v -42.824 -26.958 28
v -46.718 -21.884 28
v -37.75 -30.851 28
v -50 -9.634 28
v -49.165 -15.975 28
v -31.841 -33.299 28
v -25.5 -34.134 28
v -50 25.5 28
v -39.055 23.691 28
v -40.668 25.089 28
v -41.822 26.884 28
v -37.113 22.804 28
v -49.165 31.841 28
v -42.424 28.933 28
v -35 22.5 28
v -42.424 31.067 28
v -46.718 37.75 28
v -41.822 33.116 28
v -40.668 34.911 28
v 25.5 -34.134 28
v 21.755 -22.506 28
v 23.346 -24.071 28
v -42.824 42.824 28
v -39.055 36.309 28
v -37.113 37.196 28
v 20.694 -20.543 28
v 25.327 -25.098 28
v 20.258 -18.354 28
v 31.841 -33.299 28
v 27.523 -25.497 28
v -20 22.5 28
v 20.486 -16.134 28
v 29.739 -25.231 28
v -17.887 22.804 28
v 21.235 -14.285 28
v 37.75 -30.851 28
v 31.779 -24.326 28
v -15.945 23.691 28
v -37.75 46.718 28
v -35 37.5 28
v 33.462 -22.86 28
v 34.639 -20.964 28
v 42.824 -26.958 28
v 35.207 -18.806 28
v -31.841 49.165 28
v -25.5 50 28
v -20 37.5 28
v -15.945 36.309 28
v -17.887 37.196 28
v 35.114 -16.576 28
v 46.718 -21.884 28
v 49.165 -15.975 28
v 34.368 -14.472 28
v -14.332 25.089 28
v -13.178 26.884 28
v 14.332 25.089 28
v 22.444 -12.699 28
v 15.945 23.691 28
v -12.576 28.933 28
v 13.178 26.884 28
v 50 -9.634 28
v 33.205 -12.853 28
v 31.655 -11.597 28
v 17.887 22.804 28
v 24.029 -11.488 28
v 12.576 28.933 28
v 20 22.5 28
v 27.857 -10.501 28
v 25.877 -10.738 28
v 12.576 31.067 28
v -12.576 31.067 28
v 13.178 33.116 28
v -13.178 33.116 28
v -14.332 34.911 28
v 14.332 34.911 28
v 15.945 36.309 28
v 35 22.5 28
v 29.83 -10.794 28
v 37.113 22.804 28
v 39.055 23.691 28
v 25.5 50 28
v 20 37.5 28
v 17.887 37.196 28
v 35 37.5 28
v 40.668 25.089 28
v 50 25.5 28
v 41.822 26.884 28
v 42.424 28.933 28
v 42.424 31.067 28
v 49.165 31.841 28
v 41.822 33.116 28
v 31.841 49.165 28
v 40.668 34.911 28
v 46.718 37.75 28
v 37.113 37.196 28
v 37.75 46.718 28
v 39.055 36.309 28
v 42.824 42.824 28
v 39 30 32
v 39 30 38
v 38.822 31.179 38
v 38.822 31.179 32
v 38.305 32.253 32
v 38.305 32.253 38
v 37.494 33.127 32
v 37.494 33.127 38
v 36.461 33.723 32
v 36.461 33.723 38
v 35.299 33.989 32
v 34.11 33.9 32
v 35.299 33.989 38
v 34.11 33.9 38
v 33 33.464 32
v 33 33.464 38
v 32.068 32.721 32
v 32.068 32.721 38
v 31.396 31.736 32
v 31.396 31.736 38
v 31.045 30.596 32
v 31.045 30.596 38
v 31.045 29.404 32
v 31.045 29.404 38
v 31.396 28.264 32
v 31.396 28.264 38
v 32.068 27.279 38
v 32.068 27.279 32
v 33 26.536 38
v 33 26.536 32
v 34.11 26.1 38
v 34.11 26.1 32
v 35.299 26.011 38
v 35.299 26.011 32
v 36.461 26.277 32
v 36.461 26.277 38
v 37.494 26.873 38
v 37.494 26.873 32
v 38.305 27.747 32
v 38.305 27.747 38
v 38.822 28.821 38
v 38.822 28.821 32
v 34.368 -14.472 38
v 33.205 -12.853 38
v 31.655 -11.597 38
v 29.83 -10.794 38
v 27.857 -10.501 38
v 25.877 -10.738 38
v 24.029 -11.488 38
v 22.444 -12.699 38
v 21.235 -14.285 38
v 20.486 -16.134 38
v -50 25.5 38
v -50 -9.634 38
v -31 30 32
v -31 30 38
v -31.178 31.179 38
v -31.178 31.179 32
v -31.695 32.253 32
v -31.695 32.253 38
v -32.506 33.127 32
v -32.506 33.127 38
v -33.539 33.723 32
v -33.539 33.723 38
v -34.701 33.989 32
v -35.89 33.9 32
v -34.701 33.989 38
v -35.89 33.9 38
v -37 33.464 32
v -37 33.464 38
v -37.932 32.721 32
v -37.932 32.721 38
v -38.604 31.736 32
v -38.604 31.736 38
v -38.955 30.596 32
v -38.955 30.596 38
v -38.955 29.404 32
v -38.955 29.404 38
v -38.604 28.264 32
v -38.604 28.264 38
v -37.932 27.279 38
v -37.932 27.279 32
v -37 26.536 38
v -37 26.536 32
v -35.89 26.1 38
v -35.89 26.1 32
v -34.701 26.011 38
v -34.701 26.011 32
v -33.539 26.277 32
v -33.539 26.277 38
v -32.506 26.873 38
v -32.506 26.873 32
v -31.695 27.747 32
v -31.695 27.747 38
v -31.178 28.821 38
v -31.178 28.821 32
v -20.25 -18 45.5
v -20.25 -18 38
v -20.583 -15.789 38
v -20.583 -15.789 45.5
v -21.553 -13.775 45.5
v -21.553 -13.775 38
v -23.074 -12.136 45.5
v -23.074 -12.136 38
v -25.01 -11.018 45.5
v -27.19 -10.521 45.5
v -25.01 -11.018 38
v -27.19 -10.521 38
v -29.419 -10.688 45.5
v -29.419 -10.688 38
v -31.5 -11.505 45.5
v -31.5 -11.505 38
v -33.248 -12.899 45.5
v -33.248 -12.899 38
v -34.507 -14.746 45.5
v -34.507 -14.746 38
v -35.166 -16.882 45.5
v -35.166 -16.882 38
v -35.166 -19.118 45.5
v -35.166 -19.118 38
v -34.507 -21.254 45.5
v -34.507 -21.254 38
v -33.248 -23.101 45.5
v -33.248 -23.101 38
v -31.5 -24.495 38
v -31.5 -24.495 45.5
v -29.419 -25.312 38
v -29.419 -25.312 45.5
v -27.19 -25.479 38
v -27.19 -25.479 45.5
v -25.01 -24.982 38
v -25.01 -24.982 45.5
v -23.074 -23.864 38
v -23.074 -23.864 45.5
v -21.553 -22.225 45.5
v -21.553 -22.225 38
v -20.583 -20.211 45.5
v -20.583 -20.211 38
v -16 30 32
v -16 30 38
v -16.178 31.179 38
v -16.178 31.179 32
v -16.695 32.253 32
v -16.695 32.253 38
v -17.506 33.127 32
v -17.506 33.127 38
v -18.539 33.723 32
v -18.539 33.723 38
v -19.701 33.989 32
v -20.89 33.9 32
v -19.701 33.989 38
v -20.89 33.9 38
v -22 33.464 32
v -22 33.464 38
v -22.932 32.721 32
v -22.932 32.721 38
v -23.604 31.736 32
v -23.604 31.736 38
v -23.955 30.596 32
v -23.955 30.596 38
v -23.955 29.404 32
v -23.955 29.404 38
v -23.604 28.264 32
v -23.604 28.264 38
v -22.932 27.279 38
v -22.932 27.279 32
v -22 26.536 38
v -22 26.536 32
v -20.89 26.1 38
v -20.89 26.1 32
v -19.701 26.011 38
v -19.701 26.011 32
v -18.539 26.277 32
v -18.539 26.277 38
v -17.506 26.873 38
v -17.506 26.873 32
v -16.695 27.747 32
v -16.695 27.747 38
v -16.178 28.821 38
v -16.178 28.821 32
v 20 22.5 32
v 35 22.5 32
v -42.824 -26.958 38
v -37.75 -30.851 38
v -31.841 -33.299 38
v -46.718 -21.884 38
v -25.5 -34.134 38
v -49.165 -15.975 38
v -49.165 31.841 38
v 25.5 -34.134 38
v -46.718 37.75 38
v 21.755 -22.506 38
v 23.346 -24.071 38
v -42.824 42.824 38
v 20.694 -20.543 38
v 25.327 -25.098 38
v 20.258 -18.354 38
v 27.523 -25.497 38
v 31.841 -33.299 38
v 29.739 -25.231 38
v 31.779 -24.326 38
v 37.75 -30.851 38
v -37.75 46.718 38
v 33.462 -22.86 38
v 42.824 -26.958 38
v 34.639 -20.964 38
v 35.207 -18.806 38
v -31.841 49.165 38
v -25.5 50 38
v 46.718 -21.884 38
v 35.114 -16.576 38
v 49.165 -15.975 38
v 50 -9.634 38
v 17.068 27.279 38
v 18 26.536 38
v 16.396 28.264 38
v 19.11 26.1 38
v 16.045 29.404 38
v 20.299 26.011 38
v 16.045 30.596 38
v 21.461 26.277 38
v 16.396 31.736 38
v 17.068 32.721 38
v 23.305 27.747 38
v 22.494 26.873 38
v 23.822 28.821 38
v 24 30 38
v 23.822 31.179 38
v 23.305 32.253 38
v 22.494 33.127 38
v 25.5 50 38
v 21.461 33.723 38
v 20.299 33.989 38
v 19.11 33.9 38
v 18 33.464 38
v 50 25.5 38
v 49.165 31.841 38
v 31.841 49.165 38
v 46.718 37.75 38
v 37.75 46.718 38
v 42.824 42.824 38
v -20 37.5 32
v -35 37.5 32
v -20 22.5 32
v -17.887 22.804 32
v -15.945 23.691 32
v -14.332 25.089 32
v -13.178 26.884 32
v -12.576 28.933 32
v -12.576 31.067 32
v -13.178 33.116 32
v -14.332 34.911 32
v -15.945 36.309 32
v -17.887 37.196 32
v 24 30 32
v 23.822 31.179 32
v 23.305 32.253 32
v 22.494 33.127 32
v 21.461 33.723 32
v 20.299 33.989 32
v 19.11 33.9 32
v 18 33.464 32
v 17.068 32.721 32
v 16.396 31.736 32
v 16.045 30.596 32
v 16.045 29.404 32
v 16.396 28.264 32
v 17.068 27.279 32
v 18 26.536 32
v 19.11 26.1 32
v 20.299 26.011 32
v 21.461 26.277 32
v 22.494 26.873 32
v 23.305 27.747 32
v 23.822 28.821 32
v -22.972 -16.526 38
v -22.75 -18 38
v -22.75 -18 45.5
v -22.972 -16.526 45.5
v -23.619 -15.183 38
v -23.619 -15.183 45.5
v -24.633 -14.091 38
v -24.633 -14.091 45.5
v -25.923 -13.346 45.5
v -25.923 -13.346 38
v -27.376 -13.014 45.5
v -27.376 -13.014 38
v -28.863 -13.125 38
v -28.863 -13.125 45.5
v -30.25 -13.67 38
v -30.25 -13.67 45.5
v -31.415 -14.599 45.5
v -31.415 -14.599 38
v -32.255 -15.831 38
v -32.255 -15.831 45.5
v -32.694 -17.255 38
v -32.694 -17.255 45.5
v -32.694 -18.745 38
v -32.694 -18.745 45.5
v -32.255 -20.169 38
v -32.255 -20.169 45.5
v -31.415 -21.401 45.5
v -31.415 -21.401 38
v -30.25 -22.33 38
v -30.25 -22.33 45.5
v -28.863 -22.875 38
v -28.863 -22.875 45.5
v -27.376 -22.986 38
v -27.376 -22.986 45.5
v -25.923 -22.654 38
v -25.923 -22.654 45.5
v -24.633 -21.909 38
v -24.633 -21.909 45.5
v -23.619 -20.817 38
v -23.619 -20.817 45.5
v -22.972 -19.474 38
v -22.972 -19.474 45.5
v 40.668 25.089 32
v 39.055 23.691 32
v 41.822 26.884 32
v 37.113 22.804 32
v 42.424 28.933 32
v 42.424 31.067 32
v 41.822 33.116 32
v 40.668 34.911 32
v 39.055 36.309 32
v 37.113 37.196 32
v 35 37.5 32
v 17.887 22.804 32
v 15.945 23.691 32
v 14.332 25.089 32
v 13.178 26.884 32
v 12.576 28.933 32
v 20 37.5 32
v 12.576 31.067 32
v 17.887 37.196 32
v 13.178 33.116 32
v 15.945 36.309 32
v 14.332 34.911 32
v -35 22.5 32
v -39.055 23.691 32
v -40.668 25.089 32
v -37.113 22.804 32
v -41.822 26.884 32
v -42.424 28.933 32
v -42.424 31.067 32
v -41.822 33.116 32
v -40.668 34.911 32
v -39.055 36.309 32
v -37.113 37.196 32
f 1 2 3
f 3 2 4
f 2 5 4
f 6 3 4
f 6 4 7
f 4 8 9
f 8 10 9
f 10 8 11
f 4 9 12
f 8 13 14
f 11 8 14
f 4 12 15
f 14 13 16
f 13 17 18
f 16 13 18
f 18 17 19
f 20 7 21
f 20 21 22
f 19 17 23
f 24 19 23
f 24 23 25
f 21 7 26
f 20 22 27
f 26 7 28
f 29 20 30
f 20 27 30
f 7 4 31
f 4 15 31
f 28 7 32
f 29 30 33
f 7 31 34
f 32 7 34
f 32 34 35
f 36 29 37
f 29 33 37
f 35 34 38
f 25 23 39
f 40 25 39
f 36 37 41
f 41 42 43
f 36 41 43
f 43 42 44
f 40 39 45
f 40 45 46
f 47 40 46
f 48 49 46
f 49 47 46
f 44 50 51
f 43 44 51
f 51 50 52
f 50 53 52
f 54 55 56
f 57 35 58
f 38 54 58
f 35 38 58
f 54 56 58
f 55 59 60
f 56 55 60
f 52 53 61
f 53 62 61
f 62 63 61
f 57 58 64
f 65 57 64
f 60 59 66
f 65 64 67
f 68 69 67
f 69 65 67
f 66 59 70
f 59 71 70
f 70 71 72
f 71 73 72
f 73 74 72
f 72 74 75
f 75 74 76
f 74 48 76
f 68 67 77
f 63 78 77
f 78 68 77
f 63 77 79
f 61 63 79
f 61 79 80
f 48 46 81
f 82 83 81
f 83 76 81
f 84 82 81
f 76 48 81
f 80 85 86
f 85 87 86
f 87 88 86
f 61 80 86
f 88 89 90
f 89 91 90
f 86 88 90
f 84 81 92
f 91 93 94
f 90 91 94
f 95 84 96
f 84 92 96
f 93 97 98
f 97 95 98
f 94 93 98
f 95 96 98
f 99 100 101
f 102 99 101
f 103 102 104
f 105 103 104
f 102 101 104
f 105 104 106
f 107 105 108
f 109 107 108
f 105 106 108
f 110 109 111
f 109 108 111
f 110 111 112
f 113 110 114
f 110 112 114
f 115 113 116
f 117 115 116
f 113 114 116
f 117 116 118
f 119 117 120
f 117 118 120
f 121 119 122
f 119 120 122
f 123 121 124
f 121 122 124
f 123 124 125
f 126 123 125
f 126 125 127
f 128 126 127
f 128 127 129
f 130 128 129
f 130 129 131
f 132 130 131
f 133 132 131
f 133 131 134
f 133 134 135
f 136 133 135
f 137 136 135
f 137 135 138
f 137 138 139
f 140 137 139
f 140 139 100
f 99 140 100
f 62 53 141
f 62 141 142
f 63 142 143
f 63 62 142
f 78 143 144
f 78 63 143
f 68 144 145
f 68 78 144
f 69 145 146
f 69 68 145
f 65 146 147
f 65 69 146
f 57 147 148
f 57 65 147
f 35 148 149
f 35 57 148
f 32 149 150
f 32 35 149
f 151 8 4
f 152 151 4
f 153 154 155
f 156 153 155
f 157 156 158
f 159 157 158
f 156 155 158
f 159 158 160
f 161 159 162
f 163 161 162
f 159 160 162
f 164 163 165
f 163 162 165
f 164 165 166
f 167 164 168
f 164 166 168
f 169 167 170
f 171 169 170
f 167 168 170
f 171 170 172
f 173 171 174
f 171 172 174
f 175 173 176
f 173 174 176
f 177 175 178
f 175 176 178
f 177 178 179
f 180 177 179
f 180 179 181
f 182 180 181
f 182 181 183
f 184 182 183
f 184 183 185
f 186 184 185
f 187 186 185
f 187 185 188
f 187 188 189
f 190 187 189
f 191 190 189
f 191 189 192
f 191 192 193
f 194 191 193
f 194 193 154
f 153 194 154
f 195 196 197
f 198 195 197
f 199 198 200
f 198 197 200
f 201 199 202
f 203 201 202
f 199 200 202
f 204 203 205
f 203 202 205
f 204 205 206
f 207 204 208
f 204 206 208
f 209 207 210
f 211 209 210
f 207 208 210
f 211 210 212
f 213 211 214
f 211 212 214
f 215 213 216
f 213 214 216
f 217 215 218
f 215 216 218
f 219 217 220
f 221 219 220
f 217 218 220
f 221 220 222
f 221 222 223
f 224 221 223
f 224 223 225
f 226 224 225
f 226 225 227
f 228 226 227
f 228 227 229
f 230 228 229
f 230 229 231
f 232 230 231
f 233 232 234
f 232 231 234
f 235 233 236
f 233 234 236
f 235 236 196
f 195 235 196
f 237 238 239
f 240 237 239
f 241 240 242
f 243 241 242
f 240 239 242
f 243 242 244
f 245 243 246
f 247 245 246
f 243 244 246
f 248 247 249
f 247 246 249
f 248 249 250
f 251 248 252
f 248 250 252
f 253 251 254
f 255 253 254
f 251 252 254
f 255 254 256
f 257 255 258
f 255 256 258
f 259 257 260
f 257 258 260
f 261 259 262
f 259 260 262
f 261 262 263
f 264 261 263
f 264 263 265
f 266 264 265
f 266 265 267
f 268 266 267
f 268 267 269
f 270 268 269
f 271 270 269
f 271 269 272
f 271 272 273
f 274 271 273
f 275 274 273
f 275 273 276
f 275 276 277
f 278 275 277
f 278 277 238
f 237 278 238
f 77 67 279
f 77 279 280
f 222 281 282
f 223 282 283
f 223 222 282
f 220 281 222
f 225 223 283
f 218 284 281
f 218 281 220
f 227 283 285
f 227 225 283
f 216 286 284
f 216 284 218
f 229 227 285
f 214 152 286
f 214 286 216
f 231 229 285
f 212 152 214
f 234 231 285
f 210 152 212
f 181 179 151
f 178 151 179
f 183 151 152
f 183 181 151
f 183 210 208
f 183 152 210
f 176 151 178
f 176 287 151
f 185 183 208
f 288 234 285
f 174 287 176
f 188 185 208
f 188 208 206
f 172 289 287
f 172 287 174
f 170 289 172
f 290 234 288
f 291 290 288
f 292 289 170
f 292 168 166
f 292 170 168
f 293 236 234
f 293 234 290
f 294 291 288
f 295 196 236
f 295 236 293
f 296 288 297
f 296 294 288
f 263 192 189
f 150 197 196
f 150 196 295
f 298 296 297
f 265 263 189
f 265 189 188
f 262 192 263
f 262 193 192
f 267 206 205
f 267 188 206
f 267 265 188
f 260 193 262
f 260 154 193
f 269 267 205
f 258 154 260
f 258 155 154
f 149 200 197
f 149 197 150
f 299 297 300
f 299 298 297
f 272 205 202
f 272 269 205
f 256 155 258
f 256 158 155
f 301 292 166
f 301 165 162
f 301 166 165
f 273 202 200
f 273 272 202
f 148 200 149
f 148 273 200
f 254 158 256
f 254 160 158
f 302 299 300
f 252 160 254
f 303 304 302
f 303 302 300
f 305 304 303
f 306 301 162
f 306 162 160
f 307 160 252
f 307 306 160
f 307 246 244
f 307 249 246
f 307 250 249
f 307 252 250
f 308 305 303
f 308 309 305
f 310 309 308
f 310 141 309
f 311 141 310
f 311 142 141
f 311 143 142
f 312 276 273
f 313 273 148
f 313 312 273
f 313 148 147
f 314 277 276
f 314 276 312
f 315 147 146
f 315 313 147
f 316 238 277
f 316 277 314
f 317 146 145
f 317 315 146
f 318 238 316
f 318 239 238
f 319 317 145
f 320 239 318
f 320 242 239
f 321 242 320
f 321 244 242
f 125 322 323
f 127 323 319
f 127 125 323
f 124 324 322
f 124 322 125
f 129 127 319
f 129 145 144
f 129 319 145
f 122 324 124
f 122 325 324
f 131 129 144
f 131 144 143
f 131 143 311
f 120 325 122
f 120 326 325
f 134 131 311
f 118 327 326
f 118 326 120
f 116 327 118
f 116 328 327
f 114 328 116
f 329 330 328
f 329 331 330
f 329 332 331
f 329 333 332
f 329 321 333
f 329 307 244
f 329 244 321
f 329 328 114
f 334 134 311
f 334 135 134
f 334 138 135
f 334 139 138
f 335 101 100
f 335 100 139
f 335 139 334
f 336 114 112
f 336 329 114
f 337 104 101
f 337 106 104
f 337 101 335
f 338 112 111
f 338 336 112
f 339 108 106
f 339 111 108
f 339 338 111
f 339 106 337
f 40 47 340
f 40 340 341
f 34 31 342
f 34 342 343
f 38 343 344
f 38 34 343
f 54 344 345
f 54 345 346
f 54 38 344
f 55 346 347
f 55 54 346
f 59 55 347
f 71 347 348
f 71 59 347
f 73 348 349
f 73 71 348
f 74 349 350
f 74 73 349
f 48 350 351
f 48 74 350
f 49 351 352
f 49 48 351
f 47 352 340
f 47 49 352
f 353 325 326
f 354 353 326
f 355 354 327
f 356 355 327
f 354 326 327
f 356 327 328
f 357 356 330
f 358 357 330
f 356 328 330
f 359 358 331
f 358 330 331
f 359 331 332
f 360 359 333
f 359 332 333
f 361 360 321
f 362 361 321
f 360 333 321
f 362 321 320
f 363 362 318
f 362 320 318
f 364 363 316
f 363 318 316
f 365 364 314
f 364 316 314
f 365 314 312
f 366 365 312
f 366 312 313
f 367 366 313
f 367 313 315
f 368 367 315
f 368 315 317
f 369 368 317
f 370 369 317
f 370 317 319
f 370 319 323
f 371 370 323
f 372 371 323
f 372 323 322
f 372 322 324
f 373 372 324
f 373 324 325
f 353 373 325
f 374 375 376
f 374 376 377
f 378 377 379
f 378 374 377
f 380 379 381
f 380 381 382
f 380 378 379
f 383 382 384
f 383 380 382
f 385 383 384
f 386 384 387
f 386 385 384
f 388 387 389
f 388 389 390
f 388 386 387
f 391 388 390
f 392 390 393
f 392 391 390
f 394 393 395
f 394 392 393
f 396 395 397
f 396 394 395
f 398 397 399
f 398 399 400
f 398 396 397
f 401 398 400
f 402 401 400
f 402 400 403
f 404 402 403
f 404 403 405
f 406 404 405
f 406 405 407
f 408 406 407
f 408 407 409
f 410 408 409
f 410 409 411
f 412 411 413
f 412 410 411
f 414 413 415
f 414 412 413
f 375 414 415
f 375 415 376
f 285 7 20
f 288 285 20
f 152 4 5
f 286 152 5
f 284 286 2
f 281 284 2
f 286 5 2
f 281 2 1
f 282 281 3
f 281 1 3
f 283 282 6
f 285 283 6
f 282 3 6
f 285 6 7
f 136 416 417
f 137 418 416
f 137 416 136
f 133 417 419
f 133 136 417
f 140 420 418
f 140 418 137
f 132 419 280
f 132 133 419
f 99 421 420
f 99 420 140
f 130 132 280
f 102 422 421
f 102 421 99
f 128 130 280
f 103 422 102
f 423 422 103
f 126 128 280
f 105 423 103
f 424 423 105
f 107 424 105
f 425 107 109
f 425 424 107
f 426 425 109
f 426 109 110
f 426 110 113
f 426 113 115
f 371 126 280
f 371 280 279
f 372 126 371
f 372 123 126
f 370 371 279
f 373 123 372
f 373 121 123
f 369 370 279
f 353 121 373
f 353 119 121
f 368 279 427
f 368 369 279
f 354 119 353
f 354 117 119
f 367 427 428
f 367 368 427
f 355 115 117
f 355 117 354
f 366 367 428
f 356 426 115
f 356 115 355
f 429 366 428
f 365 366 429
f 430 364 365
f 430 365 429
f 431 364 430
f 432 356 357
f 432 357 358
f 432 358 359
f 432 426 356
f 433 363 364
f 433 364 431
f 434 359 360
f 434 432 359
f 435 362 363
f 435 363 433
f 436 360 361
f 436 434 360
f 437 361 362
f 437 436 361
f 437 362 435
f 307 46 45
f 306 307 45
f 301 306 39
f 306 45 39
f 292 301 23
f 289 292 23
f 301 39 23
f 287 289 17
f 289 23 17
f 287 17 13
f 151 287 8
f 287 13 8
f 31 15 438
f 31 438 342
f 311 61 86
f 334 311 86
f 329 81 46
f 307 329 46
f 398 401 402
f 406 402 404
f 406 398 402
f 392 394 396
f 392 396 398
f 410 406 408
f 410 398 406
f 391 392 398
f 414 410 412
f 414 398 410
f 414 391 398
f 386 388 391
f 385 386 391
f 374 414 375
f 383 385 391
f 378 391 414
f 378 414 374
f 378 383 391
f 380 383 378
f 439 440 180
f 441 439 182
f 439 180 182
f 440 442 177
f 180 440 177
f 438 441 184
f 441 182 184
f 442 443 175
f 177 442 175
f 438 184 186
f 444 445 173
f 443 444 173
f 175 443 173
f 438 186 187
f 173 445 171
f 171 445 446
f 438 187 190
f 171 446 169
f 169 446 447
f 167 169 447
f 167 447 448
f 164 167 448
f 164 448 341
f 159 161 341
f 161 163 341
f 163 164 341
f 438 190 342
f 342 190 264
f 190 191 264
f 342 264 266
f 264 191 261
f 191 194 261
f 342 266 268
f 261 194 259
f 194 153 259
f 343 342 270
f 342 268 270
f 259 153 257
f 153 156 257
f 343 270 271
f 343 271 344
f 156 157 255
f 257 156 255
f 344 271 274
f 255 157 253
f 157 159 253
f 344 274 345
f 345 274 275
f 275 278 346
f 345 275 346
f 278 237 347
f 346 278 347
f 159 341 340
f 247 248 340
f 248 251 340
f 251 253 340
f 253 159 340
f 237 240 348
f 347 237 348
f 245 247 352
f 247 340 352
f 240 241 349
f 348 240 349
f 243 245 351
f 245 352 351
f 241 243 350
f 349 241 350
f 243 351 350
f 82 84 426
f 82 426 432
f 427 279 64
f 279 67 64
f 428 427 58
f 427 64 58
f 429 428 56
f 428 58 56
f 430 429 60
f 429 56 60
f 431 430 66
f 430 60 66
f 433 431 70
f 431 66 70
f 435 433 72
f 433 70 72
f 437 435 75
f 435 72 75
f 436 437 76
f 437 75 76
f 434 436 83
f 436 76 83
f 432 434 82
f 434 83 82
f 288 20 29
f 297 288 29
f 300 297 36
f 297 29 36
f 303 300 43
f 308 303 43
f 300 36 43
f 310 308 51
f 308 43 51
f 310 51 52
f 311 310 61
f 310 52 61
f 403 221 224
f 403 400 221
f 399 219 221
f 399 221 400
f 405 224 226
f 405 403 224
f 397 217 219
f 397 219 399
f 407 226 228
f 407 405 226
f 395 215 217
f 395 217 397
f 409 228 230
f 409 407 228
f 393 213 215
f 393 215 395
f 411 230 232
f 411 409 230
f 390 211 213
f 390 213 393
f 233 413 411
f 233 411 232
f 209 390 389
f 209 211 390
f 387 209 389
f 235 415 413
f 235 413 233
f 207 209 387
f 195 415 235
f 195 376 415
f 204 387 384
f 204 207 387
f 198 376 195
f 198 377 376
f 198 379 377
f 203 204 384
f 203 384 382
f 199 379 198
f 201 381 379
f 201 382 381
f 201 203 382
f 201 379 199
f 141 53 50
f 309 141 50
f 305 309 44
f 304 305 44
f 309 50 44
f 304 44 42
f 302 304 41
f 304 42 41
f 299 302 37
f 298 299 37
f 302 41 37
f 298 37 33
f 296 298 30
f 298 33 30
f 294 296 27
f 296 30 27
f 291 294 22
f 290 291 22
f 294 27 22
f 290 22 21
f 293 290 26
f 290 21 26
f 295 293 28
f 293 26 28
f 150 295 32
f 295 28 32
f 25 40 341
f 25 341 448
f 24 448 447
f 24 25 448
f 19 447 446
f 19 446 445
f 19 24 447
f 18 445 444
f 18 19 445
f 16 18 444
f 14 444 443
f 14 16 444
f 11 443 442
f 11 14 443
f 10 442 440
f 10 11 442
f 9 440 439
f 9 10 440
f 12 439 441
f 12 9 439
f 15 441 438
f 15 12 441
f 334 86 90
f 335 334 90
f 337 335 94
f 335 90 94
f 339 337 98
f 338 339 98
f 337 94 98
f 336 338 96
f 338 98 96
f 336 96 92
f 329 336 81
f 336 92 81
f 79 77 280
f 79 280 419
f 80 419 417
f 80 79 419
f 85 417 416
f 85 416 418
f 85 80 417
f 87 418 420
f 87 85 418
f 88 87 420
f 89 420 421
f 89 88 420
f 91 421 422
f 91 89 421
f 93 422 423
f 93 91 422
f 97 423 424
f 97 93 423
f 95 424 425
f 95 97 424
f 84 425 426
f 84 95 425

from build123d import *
from build123d.topology import SkipClean

# Parameters (mm, degrees)
SKETCH1_W                = 100
SKETCH1_H                = 50
BOSS_EXTRUDE1_DEPTH      = 6
SKETCH2_R                = 5
CUT_EXTRUDE1_DEPTH       = 57.222771187
MOVE_FACE2_BY            = 15
SKETCH3_W                = 100
SKETCH3_H                = 12
BOSS_EXTRUDE2_DEPTH      = 22
SKETCH4_R                = 2.5
BOSS_EXTRUDE3_DEPTH      = 20
SKETCH5_W                = 100
SKETCH5_H                = 56.133601368
BOSS_EXTRUDE4_DEPTH      = 10
SKETCH6_R                = 5
SKETCH6_R_2              = 2.5
CUT_EXTRUDE2_DEPTH       = 75.458041876
FILLET2_R                = 24.5
FILLET3_R                = 5
CUT_EXTRUDE3_DEPTH       = 48
MOVE_FACE3_BY            = 2.5
SKETCH10_R               = 4
CUT_EXTRUDE5_DEPTH       = 65.807406984
SKETCH13_R               = 7.5
SKETCH13_R_2             = 5
BOSS_EXTRUDE8_DEPTH      = 7.5
SKETCH14_R               = 5
BOSS_EXTRUDE9_DEPTH      = 10
SKETCH15_R               = 7.5
CUT_EXTRUDE6_DEPTH       = 4
MOVE_START               = 38
MOVE_FACE4_OUTLINE_R     = 7.5
MOVE_FACE4_OUTLINE_R_2   = 5
MOVE_FACE4_DEPTH         = 7.5
MOVE_START_2             = 28
MOVE_FACE4_2_DEPTH       = 10
MOVE_FACE4_3_OUTLINE_R   = 2.5
MOVE_FACE4_3_OUTLINE_R_2 = 7.5
MOVE_FACE4_3_DEPTH       = 10
MOVE_FACE4_4_OUTLINE_R   = 7.5
MOVE_FACE4_4_OUTLINE_R_2 = 5
MOVE_FACE4_4_DEPTH       = 7.5
MOVE_FACE5_DEPTH         = 10
CUT_EXTRUDE7_DEPTH       = 4
SKETCH17_W               = 33.141989336
SKETCH17_H               = 9.244353108
BOSS_EXTRUDE10_DEPTH     = 10


# Read off the part's stored shape, not the designer's step: Move Face4, Move Face5
with BuildPart() as part:
    # Sketch1 → Boss-Extrude1 (new body)
    with BuildSketch(Plane.XY):
        Rectangle(SKETCH1_W, SKETCH1_H)
    extrude(amount=BOSS_EXTRUDE1_DEPTH)

    # Sketch2 → Cut-Extrude1 (cut, through all)
    with BuildSketch(Plane.XY.offset(6)):
        with Locations((27.75, 0)):
            Circle(SKETCH2_R)
        with Locations((-27.75, 0)):
            Circle(SKETCH2_R)
    extrude(amount=-CUT_EXTRUDE1_DEPTH, mode=Mode.SUBTRACT)

    # Move Face2: a face moved outward by 15.0
    extrude(part.faces().sort_by_distance((0, 25, 3))[0], amount=MOVE_FACE2_BY, dir=(0, 1, 0))

    # Sketch3 → Boss-Extrude2 (add)
    with BuildSketch(Plane.XY.offset(6)):
        with Locations((0, 34)):
            Rectangle(SKETCH3_W, SKETCH3_H)
    extrude(amount=BOSS_EXTRUDE2_DEPTH)

    # Sketch4 → Boss-Extrude3 (add)
    with BuildSketch(Plane(origin=(0, 0, 0), x_dir=(-1, 0, 0), z_dir=(0, 0, -1))):
        with Locations((9.999238357, -9.892069005)):
            Circle(SKETCH4_R)
        with Locations((-10.000761643, -9.892069005)):
            Circle(SKETCH4_R)
    extrude(amount=BOSS_EXTRUDE3_DEPTH)

    # Sketch5 → Boss-Extrude4 (add)
    with BuildSketch(Plane.XY.offset(28)):
        with Locations((0, 11.933199316)):
            Rectangle(SKETCH5_W, SKETCH5_H)
    extrude(amount=BOSS_EXTRUDE4_DEPTH)

    # Sketch6 → Cut-Extrude2 (cut, through all)
    with BuildSketch(Plane(origin=(0, 0, 0), x_dir=(-1, 0, 0), z_dir=(0, 0, -1))):
        with Locations(Location((27.75, 0, 0), (0, 0, 180))):
            Circle(SKETCH6_R)
        with Locations((9.999238357, -9.892069005)):
            Circle(SKETCH6_R_2)
        with Locations((-10.000761643, -9.892069005)):
            Circle(SKETCH6_R_2)
        with Locations(Location((-27.75, 0, 0), (0, 0, 180))):
            Circle(SKETCH6_R)
    extrude(amount=-CUT_EXTRUDE2_DEPTH, mode=Mode.SUBTRACT)


with BuildPart() as cut_extrude2_piece_1:
    # of the separate pieces the step leaves, piece 1, a body of its own (cut_extrude2_pieces)
    add(part.part.solids().sort_by_distance((50, 40, 0))[0])

    # Fillet2
    # the kernel refuses this fillet: 24.5 mm, written as the material it takes off along each edge
    with BuildSketch(Plane(origin=(50, -16.133601368, -33.25), x_dir=(0, 1, 0), z_dir=(0, 0, 1))) as fillet2_piece_1_section:
        with BuildLine():
            CenterArc((FILLET2_R, FILLET2_R), FILLET2_R, 180, 90)
            Line((0, FILLET2_R), (0, 0))
            Line((0, 0), (FILLET2_R, 0))
        make_face()
    fillet2_piece_1 = extrude(amount=132.5, mode=Mode.PRIVATE)
    fillet2_piece_1 = split(fillet2_piece_1, bisect_by=Plane(origin=(44.527485496, -10.661086864, 6), z_dir=(0, 0, 1)), keep=Keep.TOP, mode=Mode.PRIVATE)
    add(fillet2_piece_1, mode=Mode.SUBTRACT)
    with BuildSketch(Plane(origin=(-50, 40, -61.25), x_dir=(1, 0, 0), z_dir=(0, 0, 1)), Plane(origin=(50, 40, -61.25), x_dir=(0, -1, 0), z_dir=(0, 0, 1))) as fillet2_piece_2:
        with BuildLine():
            CenterArc((FILLET2_R, -FILLET2_R), FILLET2_R, 90, 90)
            Line((0, -FILLET2_R), (0, 0))
            Line((0, 0), (FILLET2_R, 0))
        make_face()
    extrude(amount=160.5, mode=Mode.SUBTRACT)
    with BuildSketch(Plane(origin=(-50, -16.133601368, -33.25), x_dir=(1, 0, 0), z_dir=(0, 0, 1))) as fillet2_piece_3_section:
        with BuildLine():
            CenterArc((FILLET2_R, FILLET2_R), FILLET2_R, 180, 90)
            Line((0, FILLET2_R), (0, 0))
            Line((0, 0), (FILLET2_R, 0))
        make_face()
    fillet2_piece_3 = extrude(amount=132.5, mode=Mode.PRIVATE)
    fillet2_piece_3 = split(fillet2_piece_3, bisect_by=Plane(origin=(-44.527485496, -10.661086864, 6), z_dir=(0, 0, 1)), keep=Keep.TOP, mode=Mode.PRIVATE)
    add(fillet2_piece_3, mode=Mode.SUBTRACT)
    with BuildSketch(Plane(origin=(50, -25, -61.25), x_dir=(0, 1, 0), z_dir=(0, 0, 1)), Plane(origin=(-50, -25, -61.25), x_dir=(1, 0, 0), z_dir=(0, 0, 1))) as fillet2_piece_4:
        with BuildLine():
            CenterArc((FILLET2_R, FILLET2_R), FILLET2_R, 180, 90)
            Line((0, FILLET2_R), (0, 0))
            Line((0, 0), (FILLET2_R, 0))
        make_face()
    extrude(amount=128.5, mode=Mode.SUBTRACT)

    # Fillet3
    fillet3_edges = [cut_extrude2_piece_1.edges().sort_by_distance(p)[0] for p in [
        (46.571307506, 28, 17),
        (-46.571307506, 28, 17),
    ]]
    fillet(fillet3_edges, radius=FILLET3_R)


with BuildPart() as cut_extrude2_piece_2:
    # of the separate pieces the step leaves, piece 2, a body of its own (cut_extrude2_pieces)
    add(part.part.solids().sort_by_distance((-12.499238357, -9.892069005, -20))[0])


with BuildPart() as cut_extrude2_piece_3:
    # of the separate pieces the step leaves, piece 3, a body of its own (cut_extrude2_pieces)
    add(part.part.solids().sort_by_distance((7.500761643, -9.892069005, -20))[0])


with BuildPart() as cut_extrude3_tool:
    # Sketch8 → Cut-Extrude3 (new body)
    with BuildSketch(Plane(origin=(0, 0, -20), x_dir=(-1, 0, 0), z_dir=(0, 0, -1))):
        with BuildLine():
            Line((-50, 15.5), (-50, -0.5))
            ThreePointArc((-50, -0.5), (-42.824116139, -17.824116139), (-25.5, -25))
            Line((-25.5, -25), (25.5, -25))
            ThreePointArc((25.5, -25), (42.824116139, -17.824116139), (50, -0.5))
            Line((50, -0.5), (50, 15.5))
            ThreePointArc((50, 15.5), (42.824116139, 32.824116139), (25.5, 40))
            Line((25.5, 40), (-25.5, 40))
            ThreePointArc((-25.5, 40), (-42.824116139, 32.824116139), (-50, 15.5))
        make_face()
    extrude(amount=-CUT_EXTRUDE3_DEPTH)


with BuildPart() as cut_extrude2_piece_1_1:
    add(cut_extrude2_piece_1.part)

    # Cut-Extrude3: cut by cut_extrude3_tool
    add(cut_extrude3_tool.part, mode=Mode.SUBTRACT)

    # Move Face3: a curved face moved inward by 2.5
    add(Solid.thicken(cut_extrude2_piece_1_1.faces().sort_by_distance((22.75, 0, 33))[0], -MOVE_FACE3_BY), mode=Mode.SUBTRACT)

    # Sketch10 → Cut-Extrude5 (cut, through all)
    with BuildSketch(Plane.XY.offset(38)):
        with Locations((-35, 30)):
            Circle(SKETCH10_R)
        with Locations((35, 30)):
            Circle(SKETCH10_R)
        with Locations((-20, 30)):
            Circle(SKETCH10_R)
        with Locations((20, 30)):
            Circle(SKETCH10_R)
    extrude(amount=-CUT_EXTRUDE5_DEPTH, mode=Mode.SUBTRACT)

    # Sketch13 → Boss-Extrude8 (add)
    with SkipClean():  # the faces are left unmerged after this step: merging them gives an invalid solid
        with BuildSketch(Plane.XY.offset(38)):
            with Locations(Location((-27.75, 0, 0), (0, 0, 180))):
                Circle(SKETCH13_R)
            with Locations(Location((-27.75, 0, 0), (0, 0, 180))):
                Circle(SKETCH13_R_2, mode=Mode.SUBTRACT)
        extrude(amount=BOSS_EXTRUDE8_DEPTH)
    add(cut_extrude2_piece_1_1.part.scale(1), mode=Mode.REPLACE)  # the faces are merged on a copy

    # Sketch14 → Boss-Extrude9 (add)
    with BuildSketch(Plane(origin=(0, 0, 28), x_dir=(-1, 0, 0), z_dir=(0, 0, -1))):
        with Locations((27.75, 0)):
            Circle(SKETCH14_R)
    extrude(amount=-BOSS_EXTRUDE9_DEPTH)

    # Sketch15 → Cut-Extrude6 (cut)
    with BuildSketch(Plane(origin=(0, 0, 28), x_dir=(-1, 0, 0), z_dir=(0, 0, -1))):
        with Locations((-20, 30)):
            Circle(SKETCH15_R)
        with Locations((20, 30)):
            Circle(SKETCH15_R)
    extrude(amount=-CUT_EXTRUDE6_DEPTH, mode=Mode.SUBTRACT)

    # Move Face4 outline → Move Face4 (cut)
    with BuildSketch(Plane.XY.offset(MOVE_START)):
        with Locations((-27.75, 0)):
            Circle(MOVE_FACE4_OUTLINE_R)
        with Locations((-27.75, 0)):
            Circle(MOVE_FACE4_OUTLINE_R_2, mode=Mode.SUBTRACT)
    extrude(amount=MOVE_FACE4_DEPTH, mode=Mode.SUBTRACT)

    # Move Face4 2 outline → Move Face4 2 (cut)
    with BuildSketch(Plane.XY.offset(MOVE_START_2)):
        with BuildLine():
            ThreePointArc((34.368487141, -14.472163841), (26.858773605, -10.55314056), (20.485940794, -16.133601368))
            Line((20.485940794, -16.133601368), (25.5, -16.133601368))
            ThreePointArc((25.5, -16.133601368), (30.011386672, -15.714660113), (34.368487141, -14.472163841))
        make_face()
    extrude(amount=MOVE_FACE4_2_DEPTH, mode=Mode.SUBTRACT)

    # Move Face4 3 outline → Move Face4 3 (add)
    # profile 1 of 4: a face of its own
    with BuildSketch(Plane.XY.offset(MOVE_START_2)):
        with BuildLine():
            ThreePointArc((-25.5, -16.133601368), (-42.824116139, -8.957717507), (-50, 8.366398632))
            Line((-50, 8.366398632), (-50, -9.633601368))
            ThreePointArc((-50, -9.633601368), (-42.824116139, -26.957717507), (-25.5, -34.133601368))
            Line((-25.5, -34.133601368), (25.5, -34.133601368))
            ThreePointArc((25.5, -34.133601368), (42.824116139, -26.957717507), (50, -9.633601368))
            Line((50, -9.633601368), (50, 8.366398632))
            ThreePointArc((50, 8.366398632), (45.717912045, -5.471449196), (34.368487141, -14.472163841))
            ThreePointArc((34.368487141, -14.472163841), (28.641226395, -25.44685944), (20.485940794, -16.133601368))
            Line((20.485940794, -16.133601368), (-25.5, -16.133601368))
        make_face()
        with Locations((-9.999238357, -27.892069005)):
            Circle(MOVE_FACE4_3_OUTLINE_R, mode=Mode.SUBTRACT)
        with Locations((10.000761643, -27.892069005)):
            Circle(MOVE_FACE4_3_OUTLINE_R, mode=Mode.SUBTRACT)
    # profile 2 of 4: a face of its own
    with BuildSketch(Plane.XY.offset(MOVE_START_2)):
        with Locations((27.75, 0)):
            Circle(MOVE_FACE4_3_OUTLINE_R_2)
    # profile 3 of 4: a face of its own
    with BuildSketch(Plane.XY.offset(MOVE_START_2)):
        with Locations((10.000761643, -9.892069005)):
            Circle(MOVE_FACE4_3_OUTLINE_R)
    # profile 4 of 4: a face of its own
    with BuildSketch(Plane.XY.offset(MOVE_START_2)):
        with Locations((-9.999238357, -9.892069005)):
            Circle(MOVE_FACE4_3_OUTLINE_R)
    extrude(amount=MOVE_FACE4_3_DEPTH)

    # Move Face4 4 outline → Move Face4 4 (add)
    with BuildSketch(Plane.XY.offset(MOVE_START)):
        with Locations((-27.75, -18)):
            Circle(MOVE_FACE4_4_OUTLINE_R)
        with Locations((-27.75, -18)):
            Circle(MOVE_FACE4_4_OUTLINE_R_2, mode=Mode.SUBTRACT)
    extrude(amount=MOVE_FACE4_4_DEPTH)

    # Move Face5 outline → Move Face5 (add)
    with BuildSketch(Plane.XY.offset(MOVE_START_2)):
        with BuildLine():
            Line((25.5, 50), (-25.5, 50))
            ThreePointArc((-25.5, 50), (-42.824116139, 42.824116139), (-50, 25.5))
            Line((-50, 25.5), (-50, 15.5))
            ThreePointArc((-50, 15.5), (-42.824116139, 32.824116139), (-25.5, 40))
            Line((-25.5, 40), (25.5, 40))
            ThreePointArc((25.5, 40), (42.824116139, 32.824116139), (50, 15.5))
            Line((50, 15.5), (50, 25.5))
            ThreePointArc((50, 25.5), (42.824116139, 42.824116139), (25.5, 50))
        make_face()
    extrude(amount=MOVE_FACE5_DEPTH)

    # Sketch16 → Cut-Extrude7 (cut)
    with BuildSketch(Plane(origin=(0, 0, 28), x_dir=(-1, 0, 0), z_dir=(0, 0, -1))):
        with BuildLine():
            Line((-35, 37.5), (-20, 37.5))
            ThreePointArc((-20, 37.5), (-12.5, 30), (-20, 22.5))
            Line((-20, 22.5), (-35, 22.5))
            ThreePointArc((-35, 22.5), (-42.5, 30), (-35, 37.5))
        make_face()
        with BuildLine():
            Line((20, 37.5), (35, 37.5))
            ThreePointArc((35, 37.5), (42.5, 30), (35, 22.5))
            Line((35, 22.5), (20, 22.5))
            ThreePointArc((20, 22.5), (12.5, 30), (20, 37.5))
        make_face()
    extrude(amount=-CUT_EXTRUDE7_DEPTH, mode=Mode.SUBTRACT)

    # Sketch17 → Boss-Extrude10 (add)
    with BuildSketch(Plane(origin=(0, 0, 28), x_dir=(-1, 0, 0), z_dir=(0, 0, -1))):
        with Locations((-0.344204637, -27.66739457)):
            Rectangle(SKETCH17_W, SKETCH17_H)
    extrude(amount=-BOSS_EXTRUDE10_DEPTH)


with BuildPart() as cut_extrude2_piece_2_1:
    add(cut_extrude2_piece_2.part)

    # Cut-Extrude3: cut by cut_extrude3_tool
    add(cut_extrude3_tool.part, mode=Mode.SUBTRACT)


with BuildPart() as cut_extrude2_piece_3_1:
    add(cut_extrude2_piece_3.part)

    # Cut-Extrude3: cut by cut_extrude3_tool
    add(cut_extrude3_tool.part, mode=Mode.SUBTRACT)


solid = cut_extrude2_piece_1_1.part
